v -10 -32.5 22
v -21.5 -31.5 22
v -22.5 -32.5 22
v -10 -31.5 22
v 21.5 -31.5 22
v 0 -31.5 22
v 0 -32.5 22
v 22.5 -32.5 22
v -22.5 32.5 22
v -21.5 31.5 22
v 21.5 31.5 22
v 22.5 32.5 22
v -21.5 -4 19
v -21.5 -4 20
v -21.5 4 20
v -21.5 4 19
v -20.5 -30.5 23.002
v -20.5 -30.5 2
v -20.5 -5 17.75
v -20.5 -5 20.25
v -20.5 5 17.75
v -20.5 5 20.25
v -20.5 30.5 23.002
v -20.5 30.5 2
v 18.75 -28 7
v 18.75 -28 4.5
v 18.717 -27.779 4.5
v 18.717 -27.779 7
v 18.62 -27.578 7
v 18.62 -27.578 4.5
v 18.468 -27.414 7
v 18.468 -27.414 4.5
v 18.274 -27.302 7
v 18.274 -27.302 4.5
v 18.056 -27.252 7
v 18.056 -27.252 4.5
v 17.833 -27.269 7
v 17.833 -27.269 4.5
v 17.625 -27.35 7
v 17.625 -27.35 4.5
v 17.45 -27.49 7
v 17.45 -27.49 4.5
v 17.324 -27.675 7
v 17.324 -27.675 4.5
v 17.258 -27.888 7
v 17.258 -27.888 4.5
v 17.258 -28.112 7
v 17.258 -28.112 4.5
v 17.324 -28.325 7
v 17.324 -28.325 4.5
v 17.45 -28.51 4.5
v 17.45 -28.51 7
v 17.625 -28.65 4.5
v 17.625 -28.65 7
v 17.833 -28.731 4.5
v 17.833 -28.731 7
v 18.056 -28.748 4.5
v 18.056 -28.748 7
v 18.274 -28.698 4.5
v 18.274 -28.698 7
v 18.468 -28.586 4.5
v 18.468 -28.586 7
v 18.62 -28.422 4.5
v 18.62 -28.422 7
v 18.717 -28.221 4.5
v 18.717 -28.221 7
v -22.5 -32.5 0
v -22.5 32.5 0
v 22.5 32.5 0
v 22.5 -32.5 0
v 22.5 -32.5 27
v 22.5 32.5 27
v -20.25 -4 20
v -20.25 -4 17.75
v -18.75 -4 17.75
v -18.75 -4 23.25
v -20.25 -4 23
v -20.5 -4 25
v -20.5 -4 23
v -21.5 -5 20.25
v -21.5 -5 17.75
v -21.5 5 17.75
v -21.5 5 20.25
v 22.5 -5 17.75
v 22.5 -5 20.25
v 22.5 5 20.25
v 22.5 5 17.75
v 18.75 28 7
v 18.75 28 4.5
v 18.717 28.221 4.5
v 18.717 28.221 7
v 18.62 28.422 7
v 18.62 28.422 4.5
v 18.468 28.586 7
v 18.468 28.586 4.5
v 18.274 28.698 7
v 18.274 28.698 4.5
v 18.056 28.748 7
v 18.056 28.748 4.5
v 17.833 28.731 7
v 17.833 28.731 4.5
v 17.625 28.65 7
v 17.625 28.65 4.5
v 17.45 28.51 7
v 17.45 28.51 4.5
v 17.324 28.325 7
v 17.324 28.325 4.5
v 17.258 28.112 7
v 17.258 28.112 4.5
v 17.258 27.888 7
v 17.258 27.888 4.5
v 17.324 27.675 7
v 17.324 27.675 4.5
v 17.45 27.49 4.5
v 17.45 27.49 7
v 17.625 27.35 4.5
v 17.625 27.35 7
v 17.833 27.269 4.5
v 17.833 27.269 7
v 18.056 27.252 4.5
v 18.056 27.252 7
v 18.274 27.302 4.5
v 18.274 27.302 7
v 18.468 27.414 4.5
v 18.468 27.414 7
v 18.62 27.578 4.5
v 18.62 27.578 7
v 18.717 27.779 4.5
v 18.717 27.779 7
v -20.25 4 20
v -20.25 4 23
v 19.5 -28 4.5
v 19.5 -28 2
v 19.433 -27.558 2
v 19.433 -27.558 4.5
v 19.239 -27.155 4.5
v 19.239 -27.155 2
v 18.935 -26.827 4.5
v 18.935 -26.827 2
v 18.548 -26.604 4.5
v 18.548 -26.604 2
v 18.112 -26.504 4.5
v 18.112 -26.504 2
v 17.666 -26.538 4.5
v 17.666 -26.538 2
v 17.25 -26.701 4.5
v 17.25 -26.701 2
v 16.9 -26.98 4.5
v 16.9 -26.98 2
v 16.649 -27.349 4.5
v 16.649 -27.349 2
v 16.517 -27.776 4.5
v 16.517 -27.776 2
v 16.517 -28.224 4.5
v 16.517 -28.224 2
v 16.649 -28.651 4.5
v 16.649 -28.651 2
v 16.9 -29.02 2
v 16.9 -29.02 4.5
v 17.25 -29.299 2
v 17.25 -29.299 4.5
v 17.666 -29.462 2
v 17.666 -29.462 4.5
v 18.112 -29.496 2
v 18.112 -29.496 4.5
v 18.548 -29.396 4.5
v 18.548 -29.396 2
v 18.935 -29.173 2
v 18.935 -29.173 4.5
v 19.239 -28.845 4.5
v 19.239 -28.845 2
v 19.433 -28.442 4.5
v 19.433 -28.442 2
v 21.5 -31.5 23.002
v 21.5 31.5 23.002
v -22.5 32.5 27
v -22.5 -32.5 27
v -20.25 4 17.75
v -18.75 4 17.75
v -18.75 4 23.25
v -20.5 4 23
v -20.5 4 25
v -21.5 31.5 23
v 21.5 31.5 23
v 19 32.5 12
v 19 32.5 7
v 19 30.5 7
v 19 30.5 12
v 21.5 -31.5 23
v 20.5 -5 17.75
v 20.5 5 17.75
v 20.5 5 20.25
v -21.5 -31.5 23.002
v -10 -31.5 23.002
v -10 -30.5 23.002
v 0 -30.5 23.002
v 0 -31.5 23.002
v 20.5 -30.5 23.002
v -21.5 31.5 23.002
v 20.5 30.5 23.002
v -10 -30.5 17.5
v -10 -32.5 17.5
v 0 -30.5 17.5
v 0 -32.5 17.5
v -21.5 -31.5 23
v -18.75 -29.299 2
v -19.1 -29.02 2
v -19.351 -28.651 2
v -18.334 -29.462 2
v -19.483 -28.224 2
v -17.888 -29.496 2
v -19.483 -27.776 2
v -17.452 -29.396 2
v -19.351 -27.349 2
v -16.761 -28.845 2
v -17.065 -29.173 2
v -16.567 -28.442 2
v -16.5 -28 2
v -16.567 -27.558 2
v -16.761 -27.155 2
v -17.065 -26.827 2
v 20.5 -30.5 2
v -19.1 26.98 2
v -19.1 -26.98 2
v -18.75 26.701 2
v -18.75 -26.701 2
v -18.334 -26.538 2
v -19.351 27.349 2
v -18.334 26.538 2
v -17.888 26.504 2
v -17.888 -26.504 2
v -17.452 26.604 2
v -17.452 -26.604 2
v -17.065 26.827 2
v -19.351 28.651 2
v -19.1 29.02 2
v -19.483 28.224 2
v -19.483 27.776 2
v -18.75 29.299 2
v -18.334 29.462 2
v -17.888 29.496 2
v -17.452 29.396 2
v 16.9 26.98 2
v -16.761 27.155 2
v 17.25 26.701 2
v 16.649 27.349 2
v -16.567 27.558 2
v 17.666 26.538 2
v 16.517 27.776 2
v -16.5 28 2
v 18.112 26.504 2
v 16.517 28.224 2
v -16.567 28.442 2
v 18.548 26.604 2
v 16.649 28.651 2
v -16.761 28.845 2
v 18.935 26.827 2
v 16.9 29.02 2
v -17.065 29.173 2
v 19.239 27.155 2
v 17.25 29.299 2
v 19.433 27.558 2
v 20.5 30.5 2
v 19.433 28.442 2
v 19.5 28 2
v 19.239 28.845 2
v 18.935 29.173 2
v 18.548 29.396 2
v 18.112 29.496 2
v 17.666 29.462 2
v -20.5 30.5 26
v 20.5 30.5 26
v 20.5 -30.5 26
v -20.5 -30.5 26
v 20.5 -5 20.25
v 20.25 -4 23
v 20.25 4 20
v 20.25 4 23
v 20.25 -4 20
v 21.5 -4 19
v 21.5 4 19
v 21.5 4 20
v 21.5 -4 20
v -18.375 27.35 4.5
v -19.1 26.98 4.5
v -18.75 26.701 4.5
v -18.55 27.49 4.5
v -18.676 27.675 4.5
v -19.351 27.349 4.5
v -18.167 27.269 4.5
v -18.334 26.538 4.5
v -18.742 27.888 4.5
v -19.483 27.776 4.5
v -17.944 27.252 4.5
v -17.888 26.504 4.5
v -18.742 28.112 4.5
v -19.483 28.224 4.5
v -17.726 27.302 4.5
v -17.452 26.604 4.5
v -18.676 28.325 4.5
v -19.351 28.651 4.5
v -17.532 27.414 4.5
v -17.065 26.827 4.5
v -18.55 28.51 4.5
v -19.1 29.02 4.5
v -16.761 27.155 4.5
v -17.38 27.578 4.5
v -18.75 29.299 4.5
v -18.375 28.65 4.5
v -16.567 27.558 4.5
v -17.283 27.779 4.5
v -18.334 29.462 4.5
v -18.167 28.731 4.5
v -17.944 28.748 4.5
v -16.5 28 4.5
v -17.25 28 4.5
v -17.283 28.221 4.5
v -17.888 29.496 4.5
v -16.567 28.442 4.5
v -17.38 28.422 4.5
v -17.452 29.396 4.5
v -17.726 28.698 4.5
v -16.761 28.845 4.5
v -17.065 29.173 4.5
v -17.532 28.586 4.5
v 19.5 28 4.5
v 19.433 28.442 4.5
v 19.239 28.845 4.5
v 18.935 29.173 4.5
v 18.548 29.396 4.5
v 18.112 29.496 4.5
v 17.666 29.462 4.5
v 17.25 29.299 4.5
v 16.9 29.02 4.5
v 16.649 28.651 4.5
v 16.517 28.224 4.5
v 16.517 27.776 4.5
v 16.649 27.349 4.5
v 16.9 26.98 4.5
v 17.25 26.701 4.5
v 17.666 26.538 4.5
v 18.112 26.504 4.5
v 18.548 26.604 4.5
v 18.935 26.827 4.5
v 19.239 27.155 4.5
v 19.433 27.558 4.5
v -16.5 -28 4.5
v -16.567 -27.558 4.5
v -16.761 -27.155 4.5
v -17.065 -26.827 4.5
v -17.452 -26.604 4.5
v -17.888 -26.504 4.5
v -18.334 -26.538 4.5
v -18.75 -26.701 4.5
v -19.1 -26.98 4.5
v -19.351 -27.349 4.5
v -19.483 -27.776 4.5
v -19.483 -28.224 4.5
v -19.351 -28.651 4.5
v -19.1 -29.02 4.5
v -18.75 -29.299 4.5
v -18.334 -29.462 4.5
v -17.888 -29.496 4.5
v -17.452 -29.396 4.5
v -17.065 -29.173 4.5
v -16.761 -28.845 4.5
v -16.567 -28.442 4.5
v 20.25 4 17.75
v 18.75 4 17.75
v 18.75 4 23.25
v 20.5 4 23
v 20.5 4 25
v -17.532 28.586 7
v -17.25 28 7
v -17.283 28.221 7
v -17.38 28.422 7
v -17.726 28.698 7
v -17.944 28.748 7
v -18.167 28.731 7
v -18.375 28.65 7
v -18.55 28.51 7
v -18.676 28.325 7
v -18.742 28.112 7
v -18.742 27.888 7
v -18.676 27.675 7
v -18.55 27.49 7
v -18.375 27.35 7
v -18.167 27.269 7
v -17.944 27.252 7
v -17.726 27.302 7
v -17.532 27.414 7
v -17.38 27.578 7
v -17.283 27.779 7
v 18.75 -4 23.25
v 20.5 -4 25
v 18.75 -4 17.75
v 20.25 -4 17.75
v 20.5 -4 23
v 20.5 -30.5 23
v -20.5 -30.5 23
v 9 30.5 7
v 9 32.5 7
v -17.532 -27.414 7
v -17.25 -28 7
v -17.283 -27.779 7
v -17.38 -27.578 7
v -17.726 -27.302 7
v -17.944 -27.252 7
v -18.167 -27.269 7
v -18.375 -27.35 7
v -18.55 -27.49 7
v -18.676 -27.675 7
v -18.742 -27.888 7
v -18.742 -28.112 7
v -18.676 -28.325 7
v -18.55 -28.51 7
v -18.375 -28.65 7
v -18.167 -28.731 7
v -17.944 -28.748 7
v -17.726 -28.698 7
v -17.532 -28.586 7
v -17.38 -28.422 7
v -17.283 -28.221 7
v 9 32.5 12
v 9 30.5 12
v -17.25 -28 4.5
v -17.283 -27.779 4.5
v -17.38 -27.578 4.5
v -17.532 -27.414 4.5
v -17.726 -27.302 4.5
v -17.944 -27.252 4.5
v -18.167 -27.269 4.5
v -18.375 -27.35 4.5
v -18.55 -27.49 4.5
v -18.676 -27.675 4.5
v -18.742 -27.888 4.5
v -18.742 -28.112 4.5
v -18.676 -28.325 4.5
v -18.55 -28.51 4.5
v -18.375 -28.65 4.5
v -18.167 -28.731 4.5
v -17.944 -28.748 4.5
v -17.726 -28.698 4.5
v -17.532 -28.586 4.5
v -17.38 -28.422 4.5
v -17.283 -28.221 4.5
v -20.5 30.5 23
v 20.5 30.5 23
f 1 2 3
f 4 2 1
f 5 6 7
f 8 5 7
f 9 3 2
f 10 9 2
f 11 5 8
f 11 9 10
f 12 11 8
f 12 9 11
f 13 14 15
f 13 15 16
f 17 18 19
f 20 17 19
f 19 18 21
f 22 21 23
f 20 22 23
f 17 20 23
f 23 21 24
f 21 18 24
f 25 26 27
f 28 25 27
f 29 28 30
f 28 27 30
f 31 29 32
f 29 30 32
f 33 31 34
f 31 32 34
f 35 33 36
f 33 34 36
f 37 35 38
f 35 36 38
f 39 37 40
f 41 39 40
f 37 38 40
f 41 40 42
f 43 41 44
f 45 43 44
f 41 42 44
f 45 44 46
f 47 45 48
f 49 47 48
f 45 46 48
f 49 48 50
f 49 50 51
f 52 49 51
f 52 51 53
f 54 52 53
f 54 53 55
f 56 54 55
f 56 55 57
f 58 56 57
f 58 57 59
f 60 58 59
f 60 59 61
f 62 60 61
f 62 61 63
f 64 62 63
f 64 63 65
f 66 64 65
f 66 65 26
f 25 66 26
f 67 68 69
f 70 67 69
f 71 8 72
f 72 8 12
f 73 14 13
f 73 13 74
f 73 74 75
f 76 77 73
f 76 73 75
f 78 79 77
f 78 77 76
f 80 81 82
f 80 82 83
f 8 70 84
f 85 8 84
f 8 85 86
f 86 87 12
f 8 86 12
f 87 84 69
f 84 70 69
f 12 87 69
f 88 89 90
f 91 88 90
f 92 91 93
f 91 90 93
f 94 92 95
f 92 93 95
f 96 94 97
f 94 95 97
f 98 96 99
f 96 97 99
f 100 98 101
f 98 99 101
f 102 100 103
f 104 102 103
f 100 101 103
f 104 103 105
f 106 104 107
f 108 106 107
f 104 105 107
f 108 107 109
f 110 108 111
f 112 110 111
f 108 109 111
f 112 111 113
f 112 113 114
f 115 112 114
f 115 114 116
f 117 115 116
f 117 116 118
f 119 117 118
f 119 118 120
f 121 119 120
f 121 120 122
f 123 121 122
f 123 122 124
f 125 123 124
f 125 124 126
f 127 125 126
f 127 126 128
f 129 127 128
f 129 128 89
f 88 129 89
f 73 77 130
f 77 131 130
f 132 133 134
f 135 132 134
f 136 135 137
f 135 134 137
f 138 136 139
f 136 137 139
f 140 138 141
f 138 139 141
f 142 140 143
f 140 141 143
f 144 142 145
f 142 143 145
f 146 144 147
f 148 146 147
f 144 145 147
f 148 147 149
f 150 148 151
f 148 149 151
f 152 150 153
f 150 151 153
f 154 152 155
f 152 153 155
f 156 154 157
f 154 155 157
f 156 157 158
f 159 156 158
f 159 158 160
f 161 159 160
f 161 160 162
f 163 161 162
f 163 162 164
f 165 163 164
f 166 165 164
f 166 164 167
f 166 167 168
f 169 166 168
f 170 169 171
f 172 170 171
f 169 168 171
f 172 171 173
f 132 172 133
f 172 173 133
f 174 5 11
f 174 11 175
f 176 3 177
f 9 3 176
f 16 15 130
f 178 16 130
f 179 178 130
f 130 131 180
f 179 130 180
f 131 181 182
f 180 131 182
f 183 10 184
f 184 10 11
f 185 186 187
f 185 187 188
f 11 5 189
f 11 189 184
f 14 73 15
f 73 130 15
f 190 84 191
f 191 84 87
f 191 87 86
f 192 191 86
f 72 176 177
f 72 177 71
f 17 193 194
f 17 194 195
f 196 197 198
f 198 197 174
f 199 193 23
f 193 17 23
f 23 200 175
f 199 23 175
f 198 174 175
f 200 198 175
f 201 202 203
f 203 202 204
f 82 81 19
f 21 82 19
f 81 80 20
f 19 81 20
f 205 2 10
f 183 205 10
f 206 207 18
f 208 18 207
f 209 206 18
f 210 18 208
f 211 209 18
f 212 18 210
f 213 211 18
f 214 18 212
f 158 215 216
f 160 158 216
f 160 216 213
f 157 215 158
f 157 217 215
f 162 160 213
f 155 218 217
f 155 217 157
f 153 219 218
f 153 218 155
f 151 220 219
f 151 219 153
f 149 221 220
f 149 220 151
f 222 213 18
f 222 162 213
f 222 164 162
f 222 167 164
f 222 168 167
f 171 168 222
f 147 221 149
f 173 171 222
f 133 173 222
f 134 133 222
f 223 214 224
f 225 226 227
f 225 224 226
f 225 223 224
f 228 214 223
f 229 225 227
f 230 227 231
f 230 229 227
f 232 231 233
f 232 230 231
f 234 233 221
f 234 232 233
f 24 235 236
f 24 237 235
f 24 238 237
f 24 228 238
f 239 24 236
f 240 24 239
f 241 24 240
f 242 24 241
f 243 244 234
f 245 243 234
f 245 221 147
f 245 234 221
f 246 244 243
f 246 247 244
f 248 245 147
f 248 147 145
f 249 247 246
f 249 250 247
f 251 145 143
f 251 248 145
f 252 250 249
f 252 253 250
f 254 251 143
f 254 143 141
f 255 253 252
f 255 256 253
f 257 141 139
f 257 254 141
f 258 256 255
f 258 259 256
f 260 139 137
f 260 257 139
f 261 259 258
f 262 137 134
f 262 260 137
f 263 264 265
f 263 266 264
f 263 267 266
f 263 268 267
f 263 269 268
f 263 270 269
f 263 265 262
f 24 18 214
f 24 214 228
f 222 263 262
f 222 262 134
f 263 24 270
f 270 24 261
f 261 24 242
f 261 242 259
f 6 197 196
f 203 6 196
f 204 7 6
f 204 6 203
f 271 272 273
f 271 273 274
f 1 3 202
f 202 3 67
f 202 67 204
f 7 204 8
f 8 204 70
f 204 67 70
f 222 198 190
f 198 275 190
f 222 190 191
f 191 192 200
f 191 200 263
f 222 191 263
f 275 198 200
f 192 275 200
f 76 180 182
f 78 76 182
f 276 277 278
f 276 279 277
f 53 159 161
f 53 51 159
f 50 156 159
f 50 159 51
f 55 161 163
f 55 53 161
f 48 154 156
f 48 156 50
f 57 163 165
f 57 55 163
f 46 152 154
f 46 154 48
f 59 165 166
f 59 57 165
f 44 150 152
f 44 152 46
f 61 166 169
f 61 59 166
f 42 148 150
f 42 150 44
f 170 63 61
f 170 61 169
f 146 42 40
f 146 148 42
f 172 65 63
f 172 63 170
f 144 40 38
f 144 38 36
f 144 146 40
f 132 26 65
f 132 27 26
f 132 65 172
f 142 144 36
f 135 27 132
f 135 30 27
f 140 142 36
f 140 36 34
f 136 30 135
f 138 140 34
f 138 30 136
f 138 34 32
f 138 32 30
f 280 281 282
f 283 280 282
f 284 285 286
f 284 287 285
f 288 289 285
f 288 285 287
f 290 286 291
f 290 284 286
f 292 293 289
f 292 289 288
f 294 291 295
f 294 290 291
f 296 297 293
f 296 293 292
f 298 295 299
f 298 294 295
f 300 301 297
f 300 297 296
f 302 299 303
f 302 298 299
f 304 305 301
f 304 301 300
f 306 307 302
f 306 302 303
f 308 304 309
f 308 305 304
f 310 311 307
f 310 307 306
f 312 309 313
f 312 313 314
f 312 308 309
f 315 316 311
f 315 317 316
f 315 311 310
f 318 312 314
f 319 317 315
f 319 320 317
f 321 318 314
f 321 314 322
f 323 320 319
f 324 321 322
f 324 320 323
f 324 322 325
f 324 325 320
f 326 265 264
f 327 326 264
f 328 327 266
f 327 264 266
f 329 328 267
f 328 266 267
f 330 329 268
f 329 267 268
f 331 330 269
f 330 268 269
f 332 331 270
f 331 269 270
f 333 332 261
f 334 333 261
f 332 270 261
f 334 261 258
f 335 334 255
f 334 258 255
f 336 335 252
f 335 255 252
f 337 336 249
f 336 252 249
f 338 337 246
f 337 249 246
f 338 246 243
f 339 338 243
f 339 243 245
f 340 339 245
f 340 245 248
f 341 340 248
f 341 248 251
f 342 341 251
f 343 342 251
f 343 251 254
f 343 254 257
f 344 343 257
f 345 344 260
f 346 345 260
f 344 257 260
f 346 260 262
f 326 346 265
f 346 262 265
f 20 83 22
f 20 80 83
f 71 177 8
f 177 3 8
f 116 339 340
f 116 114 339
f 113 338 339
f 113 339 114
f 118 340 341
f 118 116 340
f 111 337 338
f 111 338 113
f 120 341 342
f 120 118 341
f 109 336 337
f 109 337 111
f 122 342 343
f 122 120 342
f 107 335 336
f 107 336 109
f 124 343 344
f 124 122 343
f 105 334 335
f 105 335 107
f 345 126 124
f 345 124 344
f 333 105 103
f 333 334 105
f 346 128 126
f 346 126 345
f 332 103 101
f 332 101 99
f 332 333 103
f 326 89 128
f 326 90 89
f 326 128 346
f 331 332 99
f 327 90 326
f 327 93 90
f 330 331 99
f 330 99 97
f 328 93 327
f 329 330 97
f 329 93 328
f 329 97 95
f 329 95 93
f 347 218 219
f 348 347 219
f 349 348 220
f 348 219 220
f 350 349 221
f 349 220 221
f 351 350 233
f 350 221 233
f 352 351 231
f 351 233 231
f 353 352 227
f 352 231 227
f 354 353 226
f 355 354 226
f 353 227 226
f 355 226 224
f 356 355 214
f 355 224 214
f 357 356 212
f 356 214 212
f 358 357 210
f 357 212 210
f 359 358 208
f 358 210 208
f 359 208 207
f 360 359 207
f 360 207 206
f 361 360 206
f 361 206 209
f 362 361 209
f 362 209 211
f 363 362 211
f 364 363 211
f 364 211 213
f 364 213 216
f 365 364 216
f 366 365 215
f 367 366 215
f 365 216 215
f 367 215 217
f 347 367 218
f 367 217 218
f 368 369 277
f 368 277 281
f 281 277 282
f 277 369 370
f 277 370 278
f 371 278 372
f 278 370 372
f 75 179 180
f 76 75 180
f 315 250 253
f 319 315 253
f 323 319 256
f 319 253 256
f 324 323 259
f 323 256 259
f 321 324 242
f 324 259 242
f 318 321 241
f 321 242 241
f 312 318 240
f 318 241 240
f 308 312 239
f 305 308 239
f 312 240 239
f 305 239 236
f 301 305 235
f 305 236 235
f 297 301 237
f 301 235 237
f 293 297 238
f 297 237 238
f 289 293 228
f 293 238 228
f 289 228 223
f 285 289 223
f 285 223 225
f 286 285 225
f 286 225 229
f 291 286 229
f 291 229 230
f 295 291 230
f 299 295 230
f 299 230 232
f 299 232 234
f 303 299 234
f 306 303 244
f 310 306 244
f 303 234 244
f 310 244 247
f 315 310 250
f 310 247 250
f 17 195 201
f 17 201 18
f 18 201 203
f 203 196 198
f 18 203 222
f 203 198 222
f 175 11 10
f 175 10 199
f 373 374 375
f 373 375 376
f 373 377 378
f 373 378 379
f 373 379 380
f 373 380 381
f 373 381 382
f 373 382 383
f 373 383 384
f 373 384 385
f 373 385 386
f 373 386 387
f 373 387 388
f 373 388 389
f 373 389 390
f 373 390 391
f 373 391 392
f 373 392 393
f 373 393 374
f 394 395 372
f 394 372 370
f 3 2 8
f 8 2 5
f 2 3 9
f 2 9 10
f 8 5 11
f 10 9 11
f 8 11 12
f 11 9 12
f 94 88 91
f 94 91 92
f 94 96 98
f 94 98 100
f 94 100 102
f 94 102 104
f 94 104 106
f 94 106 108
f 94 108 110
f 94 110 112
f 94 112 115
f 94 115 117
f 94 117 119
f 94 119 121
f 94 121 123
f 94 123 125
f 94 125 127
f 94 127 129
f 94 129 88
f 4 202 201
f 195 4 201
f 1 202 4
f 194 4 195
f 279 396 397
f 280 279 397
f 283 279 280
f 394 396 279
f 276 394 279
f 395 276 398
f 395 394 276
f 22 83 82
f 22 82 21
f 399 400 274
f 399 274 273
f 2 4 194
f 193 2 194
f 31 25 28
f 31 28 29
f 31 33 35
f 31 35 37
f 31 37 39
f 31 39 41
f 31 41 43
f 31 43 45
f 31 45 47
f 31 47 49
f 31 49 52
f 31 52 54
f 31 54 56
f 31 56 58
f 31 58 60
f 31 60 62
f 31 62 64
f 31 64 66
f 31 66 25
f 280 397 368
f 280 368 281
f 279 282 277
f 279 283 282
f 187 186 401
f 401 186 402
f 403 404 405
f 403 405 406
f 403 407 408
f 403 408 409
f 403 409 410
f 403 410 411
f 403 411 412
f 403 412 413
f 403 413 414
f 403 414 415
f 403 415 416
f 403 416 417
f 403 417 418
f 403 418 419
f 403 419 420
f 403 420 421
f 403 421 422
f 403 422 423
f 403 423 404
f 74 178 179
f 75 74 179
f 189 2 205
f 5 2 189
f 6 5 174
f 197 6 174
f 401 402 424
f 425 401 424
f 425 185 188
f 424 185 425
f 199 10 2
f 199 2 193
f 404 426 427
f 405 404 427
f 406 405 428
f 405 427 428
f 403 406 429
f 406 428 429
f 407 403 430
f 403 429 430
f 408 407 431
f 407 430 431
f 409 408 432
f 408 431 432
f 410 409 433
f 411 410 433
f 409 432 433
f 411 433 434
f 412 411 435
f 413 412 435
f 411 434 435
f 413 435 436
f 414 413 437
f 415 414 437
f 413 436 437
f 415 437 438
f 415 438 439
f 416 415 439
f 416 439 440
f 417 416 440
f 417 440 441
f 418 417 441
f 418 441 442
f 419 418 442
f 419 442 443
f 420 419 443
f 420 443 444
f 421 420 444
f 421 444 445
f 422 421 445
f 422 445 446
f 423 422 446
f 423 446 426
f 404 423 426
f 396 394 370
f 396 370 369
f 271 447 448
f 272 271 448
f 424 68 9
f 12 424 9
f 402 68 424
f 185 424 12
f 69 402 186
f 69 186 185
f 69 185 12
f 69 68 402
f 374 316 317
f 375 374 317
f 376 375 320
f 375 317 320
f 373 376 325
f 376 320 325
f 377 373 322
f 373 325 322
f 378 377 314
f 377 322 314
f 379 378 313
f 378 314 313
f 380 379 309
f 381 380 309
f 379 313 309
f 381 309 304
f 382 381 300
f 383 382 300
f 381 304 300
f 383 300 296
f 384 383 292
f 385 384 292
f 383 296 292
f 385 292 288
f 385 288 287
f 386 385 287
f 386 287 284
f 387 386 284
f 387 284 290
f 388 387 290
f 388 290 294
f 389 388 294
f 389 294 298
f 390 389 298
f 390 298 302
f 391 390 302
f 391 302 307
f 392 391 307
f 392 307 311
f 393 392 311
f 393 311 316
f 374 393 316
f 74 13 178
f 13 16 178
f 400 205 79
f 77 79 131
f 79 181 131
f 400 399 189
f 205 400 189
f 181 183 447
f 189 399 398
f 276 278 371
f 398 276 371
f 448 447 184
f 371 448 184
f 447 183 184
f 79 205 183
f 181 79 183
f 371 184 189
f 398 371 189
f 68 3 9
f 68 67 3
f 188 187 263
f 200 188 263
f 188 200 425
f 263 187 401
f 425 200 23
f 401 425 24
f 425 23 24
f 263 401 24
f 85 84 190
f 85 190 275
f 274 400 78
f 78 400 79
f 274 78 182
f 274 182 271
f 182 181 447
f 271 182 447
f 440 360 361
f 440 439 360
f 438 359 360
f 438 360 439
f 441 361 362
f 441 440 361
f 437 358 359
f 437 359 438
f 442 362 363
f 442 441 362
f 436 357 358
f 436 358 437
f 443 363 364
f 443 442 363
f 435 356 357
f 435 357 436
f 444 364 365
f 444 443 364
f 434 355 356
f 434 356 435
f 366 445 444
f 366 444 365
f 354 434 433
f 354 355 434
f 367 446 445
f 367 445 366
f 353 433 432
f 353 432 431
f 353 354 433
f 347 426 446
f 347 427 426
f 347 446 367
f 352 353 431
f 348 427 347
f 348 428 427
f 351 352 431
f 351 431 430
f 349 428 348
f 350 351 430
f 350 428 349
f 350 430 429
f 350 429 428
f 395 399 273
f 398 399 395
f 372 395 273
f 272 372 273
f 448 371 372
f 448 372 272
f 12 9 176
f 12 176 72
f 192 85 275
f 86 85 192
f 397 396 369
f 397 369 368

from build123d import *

# Parameters (mm, degrees)
F0_W      = 45
F0_H      = 65
F1_DEPTH  = 2
F2_W      = 45
F2_H      = 65
F2_W_2    = 41
F2_H_2    = 61
F3_DEPTH  = 20
F4_R      = 0.75
F5_DEPTH  = 5
F6_R      = 1.5
F7_DEPTH  = 2.5
F8_W      = 10
F8_H      = 4.5
F9_DEPTH  = 2
F10_W     = 10
F10_H     = 5
F11_DEPTH = 2
F12_W     = 1
F12_H     = 1.0020786701
F14_W     = 45
F14_H     = 65
F14_W_2   = 43
F14_H_2   = 63
F15_DEPTH = 1
F16_W     = 45
F16_H     = 65
F16_W_2   = 41
F16_H_2   = 61
F17_DEPTH = 4
F18_W     = 41
F18_H     = 1
F19_DEPTH = 61
F21_DEPTH = 4
F22_W     = 1
F22_H     = 2.5
F23_DEPTH = 5
F24_W     = 10
F24_H     = 2.5
F25_DEPTH = 2


with BuildPart() as f1:
    # F0 (on Top) → F1 (new body)
    with BuildSketch(Plane.XY):
        Rectangle(F0_W, F0_H)
    extrude(amount=F1_DEPTH)

    # F2 (on face) → F3 (join)
    with BuildSketch(Plane.XY.offset(2)):
        Rectangle(F2_W, F2_H)
        Rectangle(F2_W_2, F2_H_2, mode=Mode.SUBTRACT)
    extrude(amount=F3_DEPTH)

    # F4 (on face) → F5 (join)
    with BuildSketch(Plane.XY.offset(2)):
        with Locations((-18, 28)):
            Circle(F4_R)
        with Locations((-18, -28)):
            Circle(F4_R)
        with Locations((18, 28)):
            Circle(F4_R)
        with Locations((18, -28)):
            Circle(F4_R)
    extrude(amount=F5_DEPTH)

    # F6 (on face) → F7 (join)
    with BuildSketch(Plane.XY.offset(2)):
        with Locations((-18, 28)):
            Circle(F6_R)
        with Locations((-18, -28)):
            Circle(F6_R)
        with Locations((18, 28)):
            Circle(F6_R)
        with Locations((18, -28)):
            Circle(F6_R)
    extrude(amount=F7_DEPTH)

    # F8 (on face) → F9 (cut, through all)
    with BuildSketch(Plane.XZ.offset(32.5)):
        with Locations((-5, 19.75)):
            Rectangle(F8_W, F8_H)
    extrude(amount=-F9_DEPTH, mode=Mode.SUBTRACT)

    # F10 (on face) → F11 (cut, through all)
    with BuildSketch(Plane(origin=(0, 32.5, 0), x_dir=(-1, 0, 0), z_dir=(0, 1, 0))):
        with Locations((-14, 9.5)):
            Rectangle(F10_W, F10_H)
    extrude(amount=-F11_DEPTH, mode=Mode.SUBTRACT)

    # F13: sweep along a path in F13_path
    with BuildLine(Plane(origin=(-20.5, 30.5, 22), x_dir=(0, -1, 0), z_dir=(0, 0, -1))) as f13_path:
        Line((61, -20.5), (61, -41))
        Line((61, -41), (0, -41))
        Line((0, -41), (0, 0))
        Line((0, 0), (61, 0))
        Line((61, 0), (61, -10.5))
    # F12 (on face) → F13 (sweep)
    with BuildSketch(Plane(origin=(0, -30.5, 0), x_dir=(-1, 0, 0), z_dir=(0, 1, 0))):
        with Locations((21, 22.5010393351)):
            Rectangle(F12_W, F12_H)
    sweep(path=f13_path.line, transition=Transition.RIGHT)

    # F22 (on Front) → F23 (cut, symmetric)
    with BuildSketch(Plane.XZ):
        with Locations((-21, 19)):
            Rectangle(F22_W, F22_H)
    extrude(amount=F23_DEPTH, both=True, mode=Mode.SUBTRACT)

    # F24 (on face) → F25 (cut)
    with BuildSketch(Plane.YZ.offset(22.5)):
        with Locations((0, 19)):
            Rectangle(F24_W, F24_H)
    extrude(amount=-F25_DEPTH, mode=Mode.SUBTRACT)


with BuildPart() as f15:
    # F14 (on face) → F15 (new body)
    with BuildSketch(Plane.XY.offset(22)):
        Rectangle(F14_W, F14_H)
        Rectangle(F14_W_2, F14_H_2, mode=Mode.SUBTRACT)
    extrude(amount=F15_DEPTH)

    # F16 (on face) → F17 (join)
    with BuildSketch(Plane.XY.offset(23)):
        Rectangle(F16_W, F16_H)
        Rectangle(F16_W_2, F16_H_2, mode=Mode.SUBTRACT)
    extrude(amount=F17_DEPTH)

    # F18 (on face) → F19 (join, through all)
    with BuildSketch(Plane(origin=(0, -30.5, 0), x_dir=(-1, 0, 0), z_dir=(0, 1, 0))):
        with Locations((0, 26.5)):
            Rectangle(F18_W, F18_H)
    extrude(amount=F19_DEPTH)

    # F20 (on Front) → F21 (join, symmetric)
    with BuildSketch(Plane.XZ):
        Polygon((-18.75, 23.25), (-20.5, 25), (-20.5, 23), (-20.25, 23), (-20.25, 20), (-21.5, 20), (-21.5, 19), (-20.25, 17.75), (-18.75, 17.75), align=None)
        Polygon((20.25, 23), (20.5, 23), (20.5, 25), (18.75, 23.25), (18.75, 17.75), (20.25, 17.75), (21.5, 19), (21.5, 20), (20.25, 20), align=None)
    extrude(amount=F21_DEPTH, both=True)


solid = Compound([f1.part, f15.part])
